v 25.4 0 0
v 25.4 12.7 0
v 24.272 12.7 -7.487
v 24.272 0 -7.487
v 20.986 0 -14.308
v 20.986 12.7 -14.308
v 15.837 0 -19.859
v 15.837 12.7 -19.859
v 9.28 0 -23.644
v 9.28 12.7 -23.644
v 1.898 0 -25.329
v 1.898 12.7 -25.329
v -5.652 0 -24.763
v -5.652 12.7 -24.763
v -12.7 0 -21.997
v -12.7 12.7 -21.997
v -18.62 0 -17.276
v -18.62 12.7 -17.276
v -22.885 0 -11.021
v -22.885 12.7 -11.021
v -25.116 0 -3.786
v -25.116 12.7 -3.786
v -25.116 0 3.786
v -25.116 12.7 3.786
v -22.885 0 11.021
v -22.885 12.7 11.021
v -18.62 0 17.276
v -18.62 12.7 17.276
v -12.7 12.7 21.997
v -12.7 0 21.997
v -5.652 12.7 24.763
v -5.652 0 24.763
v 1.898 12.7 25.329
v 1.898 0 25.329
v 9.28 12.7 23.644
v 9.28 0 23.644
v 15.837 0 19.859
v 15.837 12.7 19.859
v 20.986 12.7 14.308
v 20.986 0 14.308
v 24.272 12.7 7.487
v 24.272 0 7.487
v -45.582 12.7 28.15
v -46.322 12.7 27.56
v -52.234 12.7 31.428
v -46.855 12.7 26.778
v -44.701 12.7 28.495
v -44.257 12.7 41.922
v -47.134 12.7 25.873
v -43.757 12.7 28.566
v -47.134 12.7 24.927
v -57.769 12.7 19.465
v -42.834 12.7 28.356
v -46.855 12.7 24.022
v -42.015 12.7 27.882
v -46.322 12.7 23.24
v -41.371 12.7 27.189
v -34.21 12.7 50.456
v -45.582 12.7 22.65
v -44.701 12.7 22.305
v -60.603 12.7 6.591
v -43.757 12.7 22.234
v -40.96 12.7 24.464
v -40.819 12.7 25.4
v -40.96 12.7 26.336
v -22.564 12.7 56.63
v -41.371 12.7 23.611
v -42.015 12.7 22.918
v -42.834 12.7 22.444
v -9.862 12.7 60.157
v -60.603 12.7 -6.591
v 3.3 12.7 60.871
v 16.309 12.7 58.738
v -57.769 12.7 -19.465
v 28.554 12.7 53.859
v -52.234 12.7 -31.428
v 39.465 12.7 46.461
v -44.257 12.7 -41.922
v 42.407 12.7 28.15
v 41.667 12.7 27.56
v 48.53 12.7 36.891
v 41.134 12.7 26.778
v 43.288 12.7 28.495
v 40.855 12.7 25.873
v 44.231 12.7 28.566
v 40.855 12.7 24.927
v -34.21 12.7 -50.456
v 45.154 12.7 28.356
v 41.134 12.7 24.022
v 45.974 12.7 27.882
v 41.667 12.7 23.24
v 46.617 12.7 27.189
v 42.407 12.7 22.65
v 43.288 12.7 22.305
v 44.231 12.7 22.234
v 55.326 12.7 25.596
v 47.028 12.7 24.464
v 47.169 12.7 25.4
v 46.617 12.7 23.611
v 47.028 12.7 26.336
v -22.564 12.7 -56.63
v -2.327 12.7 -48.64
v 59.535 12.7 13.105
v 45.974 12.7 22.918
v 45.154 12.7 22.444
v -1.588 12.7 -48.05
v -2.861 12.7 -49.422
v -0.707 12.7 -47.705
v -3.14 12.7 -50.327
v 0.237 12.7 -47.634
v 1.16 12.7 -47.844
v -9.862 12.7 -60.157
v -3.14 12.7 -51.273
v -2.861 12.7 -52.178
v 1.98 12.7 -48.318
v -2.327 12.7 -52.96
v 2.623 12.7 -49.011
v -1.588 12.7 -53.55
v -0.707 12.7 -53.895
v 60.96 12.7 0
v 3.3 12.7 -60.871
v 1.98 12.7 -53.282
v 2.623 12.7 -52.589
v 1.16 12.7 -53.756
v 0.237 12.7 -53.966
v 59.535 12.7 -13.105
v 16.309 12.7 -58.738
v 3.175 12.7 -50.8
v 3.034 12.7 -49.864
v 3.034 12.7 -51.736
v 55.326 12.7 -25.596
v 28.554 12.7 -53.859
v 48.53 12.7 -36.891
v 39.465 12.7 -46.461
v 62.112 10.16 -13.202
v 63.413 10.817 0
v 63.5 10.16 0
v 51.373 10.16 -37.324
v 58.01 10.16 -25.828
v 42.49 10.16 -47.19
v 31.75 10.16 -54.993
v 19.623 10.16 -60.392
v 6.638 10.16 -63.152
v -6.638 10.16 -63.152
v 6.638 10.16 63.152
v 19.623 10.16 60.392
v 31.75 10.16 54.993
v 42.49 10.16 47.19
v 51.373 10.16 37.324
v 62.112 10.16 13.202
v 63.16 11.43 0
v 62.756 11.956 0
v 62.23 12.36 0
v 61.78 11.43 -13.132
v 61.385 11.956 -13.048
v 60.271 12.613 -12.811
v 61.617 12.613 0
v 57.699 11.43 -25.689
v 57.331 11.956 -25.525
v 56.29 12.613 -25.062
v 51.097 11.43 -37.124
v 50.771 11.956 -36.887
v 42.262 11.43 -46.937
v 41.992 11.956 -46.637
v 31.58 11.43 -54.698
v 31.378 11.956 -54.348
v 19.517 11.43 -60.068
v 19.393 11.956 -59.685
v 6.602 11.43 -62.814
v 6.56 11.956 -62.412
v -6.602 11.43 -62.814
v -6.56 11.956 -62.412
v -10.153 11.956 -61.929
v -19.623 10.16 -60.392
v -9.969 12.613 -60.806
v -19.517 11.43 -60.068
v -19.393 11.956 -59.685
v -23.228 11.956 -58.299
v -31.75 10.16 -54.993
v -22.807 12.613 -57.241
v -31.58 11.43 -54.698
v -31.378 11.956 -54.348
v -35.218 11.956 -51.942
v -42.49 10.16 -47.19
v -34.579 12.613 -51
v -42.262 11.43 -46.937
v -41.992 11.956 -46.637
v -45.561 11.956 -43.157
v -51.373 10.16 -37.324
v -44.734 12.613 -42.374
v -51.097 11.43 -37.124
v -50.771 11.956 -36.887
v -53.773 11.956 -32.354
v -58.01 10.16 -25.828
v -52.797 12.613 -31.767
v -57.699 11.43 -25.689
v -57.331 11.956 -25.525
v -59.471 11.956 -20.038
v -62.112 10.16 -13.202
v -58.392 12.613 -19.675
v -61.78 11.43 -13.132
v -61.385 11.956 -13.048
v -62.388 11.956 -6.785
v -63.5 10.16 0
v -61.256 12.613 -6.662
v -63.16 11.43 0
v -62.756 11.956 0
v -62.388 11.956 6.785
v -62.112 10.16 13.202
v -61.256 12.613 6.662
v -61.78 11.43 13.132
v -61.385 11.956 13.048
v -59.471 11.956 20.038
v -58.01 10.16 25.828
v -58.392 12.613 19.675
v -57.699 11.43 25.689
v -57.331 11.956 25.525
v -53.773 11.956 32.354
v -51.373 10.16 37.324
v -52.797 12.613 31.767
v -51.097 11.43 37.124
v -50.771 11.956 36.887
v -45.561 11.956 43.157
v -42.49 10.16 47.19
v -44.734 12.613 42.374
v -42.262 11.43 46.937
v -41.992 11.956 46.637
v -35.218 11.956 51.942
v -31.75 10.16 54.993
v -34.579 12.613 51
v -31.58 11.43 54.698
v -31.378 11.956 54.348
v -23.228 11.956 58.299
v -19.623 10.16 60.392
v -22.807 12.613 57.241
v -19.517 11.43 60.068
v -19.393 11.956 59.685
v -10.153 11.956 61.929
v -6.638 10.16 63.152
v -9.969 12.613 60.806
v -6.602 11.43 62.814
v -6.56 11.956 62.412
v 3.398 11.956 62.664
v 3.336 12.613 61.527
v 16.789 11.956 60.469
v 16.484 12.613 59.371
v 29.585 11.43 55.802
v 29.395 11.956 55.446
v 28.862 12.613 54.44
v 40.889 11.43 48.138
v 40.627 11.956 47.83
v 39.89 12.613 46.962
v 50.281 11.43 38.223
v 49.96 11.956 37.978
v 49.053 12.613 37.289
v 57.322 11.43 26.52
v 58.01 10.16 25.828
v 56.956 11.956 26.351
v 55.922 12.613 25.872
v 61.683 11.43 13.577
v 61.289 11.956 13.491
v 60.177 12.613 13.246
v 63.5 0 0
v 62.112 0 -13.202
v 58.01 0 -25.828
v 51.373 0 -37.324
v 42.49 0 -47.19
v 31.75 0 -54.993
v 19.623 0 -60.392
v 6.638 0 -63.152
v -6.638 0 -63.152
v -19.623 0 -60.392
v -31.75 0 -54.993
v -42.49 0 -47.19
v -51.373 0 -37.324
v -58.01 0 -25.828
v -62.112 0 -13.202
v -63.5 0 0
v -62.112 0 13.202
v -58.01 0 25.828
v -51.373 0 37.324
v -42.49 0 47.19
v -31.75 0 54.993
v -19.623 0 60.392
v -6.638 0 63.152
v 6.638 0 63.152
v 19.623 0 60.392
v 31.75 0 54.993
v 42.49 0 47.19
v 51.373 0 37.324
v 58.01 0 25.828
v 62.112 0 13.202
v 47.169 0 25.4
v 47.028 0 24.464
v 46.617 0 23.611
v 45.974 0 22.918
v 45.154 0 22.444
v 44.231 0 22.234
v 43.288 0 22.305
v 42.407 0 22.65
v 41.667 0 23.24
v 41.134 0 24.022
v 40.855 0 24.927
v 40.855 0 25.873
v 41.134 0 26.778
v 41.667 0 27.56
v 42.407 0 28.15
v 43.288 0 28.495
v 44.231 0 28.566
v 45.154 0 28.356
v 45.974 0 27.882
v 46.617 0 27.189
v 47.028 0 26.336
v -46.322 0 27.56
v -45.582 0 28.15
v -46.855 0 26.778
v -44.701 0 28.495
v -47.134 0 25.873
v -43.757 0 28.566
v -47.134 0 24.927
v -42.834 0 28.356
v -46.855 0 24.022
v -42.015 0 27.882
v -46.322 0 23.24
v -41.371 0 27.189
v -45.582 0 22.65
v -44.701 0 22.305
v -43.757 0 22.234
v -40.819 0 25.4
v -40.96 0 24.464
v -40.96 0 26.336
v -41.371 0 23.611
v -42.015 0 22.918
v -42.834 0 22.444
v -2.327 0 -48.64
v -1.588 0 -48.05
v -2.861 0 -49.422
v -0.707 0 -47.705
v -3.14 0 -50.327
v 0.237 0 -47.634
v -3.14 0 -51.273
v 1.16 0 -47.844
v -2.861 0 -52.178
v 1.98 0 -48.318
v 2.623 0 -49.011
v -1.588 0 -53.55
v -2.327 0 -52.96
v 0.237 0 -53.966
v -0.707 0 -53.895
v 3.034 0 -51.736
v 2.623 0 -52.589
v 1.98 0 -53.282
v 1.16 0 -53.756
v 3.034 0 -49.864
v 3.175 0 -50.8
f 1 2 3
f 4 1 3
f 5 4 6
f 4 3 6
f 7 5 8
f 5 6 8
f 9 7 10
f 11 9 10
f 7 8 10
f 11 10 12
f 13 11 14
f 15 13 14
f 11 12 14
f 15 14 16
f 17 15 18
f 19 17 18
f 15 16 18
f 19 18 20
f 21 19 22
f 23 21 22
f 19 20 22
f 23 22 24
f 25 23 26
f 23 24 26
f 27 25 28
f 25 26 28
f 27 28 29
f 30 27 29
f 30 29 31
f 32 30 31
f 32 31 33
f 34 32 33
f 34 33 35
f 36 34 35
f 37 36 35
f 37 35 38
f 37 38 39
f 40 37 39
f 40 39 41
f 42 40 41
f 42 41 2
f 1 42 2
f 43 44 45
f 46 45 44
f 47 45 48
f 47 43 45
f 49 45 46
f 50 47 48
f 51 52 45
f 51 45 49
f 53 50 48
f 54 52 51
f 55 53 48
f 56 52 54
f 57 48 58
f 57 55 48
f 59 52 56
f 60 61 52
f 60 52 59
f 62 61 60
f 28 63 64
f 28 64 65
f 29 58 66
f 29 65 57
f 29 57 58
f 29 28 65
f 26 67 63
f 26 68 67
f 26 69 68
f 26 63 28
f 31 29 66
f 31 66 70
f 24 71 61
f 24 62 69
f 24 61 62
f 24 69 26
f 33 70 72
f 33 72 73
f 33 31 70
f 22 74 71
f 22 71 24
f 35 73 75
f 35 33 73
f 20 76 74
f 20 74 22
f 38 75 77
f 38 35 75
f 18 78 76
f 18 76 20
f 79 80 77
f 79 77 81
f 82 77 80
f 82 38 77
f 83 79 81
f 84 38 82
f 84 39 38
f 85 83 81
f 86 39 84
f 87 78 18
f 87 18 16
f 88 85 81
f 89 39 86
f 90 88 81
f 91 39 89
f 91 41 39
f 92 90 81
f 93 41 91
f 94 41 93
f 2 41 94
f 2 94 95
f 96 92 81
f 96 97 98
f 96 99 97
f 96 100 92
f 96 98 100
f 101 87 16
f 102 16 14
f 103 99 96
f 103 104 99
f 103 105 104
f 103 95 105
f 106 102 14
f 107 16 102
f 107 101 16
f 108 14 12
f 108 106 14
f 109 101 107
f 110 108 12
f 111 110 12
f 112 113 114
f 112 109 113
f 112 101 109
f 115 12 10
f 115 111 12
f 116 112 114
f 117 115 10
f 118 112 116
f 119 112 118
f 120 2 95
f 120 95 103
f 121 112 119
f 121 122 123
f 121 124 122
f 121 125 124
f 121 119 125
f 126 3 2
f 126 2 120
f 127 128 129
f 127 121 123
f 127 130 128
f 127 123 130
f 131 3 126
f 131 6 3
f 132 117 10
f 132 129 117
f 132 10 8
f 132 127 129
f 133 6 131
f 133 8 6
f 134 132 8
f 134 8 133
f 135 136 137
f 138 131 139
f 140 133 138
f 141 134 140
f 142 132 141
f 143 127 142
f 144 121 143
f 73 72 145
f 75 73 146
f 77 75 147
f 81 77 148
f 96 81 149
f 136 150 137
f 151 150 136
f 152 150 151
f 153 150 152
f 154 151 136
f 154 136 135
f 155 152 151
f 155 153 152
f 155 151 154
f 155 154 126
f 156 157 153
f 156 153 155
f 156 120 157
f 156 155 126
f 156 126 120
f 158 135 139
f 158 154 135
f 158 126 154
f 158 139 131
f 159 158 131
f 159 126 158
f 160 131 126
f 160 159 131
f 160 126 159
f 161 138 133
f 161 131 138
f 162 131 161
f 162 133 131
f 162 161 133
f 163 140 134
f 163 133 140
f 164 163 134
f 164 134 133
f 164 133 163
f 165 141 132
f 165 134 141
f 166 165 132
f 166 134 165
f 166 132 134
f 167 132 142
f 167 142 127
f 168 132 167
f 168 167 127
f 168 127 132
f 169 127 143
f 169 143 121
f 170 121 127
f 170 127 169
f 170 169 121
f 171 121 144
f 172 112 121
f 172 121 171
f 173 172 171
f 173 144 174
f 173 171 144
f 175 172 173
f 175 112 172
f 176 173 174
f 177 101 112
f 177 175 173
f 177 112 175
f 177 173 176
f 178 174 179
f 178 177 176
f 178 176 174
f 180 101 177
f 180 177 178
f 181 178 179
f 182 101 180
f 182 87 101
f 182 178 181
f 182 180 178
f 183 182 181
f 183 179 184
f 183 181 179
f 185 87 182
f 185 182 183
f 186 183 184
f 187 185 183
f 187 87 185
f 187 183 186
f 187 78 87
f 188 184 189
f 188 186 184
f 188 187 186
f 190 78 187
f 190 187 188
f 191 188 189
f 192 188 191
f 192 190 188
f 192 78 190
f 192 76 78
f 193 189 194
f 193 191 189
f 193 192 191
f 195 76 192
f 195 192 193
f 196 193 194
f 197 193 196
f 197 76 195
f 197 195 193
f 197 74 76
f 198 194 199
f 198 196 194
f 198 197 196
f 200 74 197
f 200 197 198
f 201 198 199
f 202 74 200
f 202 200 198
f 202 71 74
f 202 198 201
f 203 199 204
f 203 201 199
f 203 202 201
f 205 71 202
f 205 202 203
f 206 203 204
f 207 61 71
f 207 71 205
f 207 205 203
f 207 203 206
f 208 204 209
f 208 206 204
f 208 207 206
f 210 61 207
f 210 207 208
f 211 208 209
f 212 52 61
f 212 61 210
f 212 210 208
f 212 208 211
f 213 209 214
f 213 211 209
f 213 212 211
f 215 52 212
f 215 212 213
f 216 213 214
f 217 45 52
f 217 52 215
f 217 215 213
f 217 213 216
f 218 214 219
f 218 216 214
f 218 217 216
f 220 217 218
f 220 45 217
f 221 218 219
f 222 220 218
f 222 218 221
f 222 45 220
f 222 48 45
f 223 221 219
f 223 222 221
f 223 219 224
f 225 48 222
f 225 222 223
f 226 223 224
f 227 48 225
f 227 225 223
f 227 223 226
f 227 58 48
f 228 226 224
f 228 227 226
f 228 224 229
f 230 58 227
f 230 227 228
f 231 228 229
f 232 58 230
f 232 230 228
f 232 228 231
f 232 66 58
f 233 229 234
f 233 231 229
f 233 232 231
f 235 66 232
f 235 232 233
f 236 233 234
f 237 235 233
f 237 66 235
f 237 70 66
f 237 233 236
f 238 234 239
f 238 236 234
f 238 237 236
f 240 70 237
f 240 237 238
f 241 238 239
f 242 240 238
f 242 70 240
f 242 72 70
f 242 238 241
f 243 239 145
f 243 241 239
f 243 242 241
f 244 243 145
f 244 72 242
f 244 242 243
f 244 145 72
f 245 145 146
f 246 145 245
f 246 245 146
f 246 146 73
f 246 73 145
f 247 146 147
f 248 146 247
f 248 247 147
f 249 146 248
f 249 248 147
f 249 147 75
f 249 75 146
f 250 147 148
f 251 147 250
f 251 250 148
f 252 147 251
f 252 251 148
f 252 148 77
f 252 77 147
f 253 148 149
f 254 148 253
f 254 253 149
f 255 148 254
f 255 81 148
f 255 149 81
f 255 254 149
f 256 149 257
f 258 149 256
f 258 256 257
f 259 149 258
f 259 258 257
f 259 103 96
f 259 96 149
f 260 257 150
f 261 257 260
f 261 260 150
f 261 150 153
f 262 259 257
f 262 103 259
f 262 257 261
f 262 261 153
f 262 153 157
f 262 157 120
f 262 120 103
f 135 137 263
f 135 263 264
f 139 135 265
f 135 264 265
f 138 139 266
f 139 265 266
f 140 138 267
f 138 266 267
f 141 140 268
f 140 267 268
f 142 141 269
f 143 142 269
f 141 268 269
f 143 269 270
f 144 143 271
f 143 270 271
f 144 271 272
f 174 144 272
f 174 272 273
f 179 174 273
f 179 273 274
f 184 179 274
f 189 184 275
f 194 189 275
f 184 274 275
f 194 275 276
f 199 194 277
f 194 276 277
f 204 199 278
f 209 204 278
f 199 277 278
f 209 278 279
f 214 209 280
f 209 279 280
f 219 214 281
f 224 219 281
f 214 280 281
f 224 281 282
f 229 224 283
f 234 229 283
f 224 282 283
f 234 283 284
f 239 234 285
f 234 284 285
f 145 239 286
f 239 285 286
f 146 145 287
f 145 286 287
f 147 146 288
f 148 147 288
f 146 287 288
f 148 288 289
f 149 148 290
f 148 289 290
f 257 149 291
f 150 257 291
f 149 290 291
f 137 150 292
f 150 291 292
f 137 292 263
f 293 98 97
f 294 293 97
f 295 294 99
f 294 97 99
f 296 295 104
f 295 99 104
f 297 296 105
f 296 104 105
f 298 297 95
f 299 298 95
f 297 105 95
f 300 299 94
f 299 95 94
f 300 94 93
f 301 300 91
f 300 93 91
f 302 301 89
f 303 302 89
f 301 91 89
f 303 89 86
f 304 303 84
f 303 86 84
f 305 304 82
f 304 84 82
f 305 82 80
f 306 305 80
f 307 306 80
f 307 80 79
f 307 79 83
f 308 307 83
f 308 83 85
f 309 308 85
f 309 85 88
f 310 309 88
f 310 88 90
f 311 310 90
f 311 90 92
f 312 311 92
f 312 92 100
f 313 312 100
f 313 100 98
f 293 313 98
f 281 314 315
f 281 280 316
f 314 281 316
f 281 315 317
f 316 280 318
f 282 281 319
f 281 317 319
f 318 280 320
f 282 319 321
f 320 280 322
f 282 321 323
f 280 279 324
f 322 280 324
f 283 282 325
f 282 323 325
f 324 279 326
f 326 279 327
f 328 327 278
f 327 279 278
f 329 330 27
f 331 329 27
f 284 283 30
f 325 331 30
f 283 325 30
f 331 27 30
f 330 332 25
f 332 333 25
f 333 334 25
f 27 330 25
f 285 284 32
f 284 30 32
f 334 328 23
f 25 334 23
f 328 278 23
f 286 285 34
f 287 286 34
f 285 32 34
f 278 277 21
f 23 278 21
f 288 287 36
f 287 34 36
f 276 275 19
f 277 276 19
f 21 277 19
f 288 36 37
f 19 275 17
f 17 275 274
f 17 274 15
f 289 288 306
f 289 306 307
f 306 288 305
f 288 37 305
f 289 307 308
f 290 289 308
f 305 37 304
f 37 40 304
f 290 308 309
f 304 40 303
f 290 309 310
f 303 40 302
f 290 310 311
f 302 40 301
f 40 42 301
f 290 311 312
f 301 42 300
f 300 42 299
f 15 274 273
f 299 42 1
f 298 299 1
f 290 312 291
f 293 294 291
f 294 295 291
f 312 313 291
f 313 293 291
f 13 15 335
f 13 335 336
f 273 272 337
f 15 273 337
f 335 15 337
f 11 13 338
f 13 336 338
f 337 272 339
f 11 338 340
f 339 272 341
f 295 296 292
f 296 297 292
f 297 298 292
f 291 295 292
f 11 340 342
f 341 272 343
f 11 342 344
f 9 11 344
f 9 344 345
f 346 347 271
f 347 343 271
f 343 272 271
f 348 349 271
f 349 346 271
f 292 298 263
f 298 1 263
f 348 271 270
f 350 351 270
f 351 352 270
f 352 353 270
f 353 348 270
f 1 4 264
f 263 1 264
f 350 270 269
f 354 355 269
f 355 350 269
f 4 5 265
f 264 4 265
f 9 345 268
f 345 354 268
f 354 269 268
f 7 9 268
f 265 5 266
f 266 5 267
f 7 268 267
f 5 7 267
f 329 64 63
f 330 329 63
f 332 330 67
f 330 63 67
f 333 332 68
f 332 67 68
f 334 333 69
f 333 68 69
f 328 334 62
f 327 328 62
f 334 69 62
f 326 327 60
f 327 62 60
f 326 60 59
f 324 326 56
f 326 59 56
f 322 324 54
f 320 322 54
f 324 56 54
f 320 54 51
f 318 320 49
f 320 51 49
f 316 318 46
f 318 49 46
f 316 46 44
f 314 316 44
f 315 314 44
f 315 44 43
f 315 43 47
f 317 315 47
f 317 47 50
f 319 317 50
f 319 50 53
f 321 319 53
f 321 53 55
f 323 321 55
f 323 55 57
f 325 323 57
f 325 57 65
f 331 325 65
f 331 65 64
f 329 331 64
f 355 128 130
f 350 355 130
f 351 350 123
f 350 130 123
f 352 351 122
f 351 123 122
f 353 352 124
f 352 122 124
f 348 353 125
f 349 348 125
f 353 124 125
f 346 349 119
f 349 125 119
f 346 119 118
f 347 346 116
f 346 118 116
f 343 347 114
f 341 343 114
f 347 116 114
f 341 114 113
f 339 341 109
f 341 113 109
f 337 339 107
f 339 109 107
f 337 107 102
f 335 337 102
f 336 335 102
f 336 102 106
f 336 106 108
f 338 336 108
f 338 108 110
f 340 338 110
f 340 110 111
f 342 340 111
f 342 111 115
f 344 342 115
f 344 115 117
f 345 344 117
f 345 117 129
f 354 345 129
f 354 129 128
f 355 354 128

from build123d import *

# Parameters (mm, degrees)
SKETCH1_R           = 63.5
BOSS_EXTRUDE1_DEPTH = 12.7
SKETCH2_R           = 25.4
CUT_EXTRUDE1_DEPTH  = 13.7
SKETCH3_R           = 3.175
CUT_EXTRUDE2_DEPTH  = 13.7
FILLET1_R           = 2.54


with BuildPart() as part:
    # Sketch1 → Boss-Extrude1 (new body)
    with BuildSketch(Plane(origin=(0, 0, 0), x_dir=(1, 0, 0), z_dir=(0, 1, 0))):
        Circle(SKETCH1_R)
    extrude(amount=BOSS_EXTRUDE1_DEPTH)

    # Sketch2 → Cut-Extrude1 (cut, through all)
    with BuildSketch(Plane(origin=(0, 12.7, 0), x_dir=(1, 0, 0), z_dir=(0, 1, 0))):
        Circle(SKETCH2_R)
    extrude(amount=-CUT_EXTRUDE1_DEPTH, mode=Mode.SUBTRACT)

    # Sketch3 → Cut-Extrude2 (cut, through all)
    with BuildSketch(Plane(origin=(0, 12.7, 0), x_dir=(1, 0, 0), z_dir=(0, 1, 0))):
        with Locations((0, 50.8)):
            Circle(SKETCH3_R)
        with Locations((43.994090512, -25.4)):
            Circle(SKETCH3_R)
        with Locations((-43.994090512, -25.4)):
            Circle(SKETCH3_R)
    extrude(amount=-CUT_EXTRUDE2_DEPTH, mode=Mode.SUBTRACT)

    # Fillet1
    fillet1_edges = [part.edges().sort_by_distance(p)[0] for p in [
        (-63.5, 12.7, 0),
    ]]
    fillet(fillet1_edges, radius=FILLET1_R)


solid = part.part
